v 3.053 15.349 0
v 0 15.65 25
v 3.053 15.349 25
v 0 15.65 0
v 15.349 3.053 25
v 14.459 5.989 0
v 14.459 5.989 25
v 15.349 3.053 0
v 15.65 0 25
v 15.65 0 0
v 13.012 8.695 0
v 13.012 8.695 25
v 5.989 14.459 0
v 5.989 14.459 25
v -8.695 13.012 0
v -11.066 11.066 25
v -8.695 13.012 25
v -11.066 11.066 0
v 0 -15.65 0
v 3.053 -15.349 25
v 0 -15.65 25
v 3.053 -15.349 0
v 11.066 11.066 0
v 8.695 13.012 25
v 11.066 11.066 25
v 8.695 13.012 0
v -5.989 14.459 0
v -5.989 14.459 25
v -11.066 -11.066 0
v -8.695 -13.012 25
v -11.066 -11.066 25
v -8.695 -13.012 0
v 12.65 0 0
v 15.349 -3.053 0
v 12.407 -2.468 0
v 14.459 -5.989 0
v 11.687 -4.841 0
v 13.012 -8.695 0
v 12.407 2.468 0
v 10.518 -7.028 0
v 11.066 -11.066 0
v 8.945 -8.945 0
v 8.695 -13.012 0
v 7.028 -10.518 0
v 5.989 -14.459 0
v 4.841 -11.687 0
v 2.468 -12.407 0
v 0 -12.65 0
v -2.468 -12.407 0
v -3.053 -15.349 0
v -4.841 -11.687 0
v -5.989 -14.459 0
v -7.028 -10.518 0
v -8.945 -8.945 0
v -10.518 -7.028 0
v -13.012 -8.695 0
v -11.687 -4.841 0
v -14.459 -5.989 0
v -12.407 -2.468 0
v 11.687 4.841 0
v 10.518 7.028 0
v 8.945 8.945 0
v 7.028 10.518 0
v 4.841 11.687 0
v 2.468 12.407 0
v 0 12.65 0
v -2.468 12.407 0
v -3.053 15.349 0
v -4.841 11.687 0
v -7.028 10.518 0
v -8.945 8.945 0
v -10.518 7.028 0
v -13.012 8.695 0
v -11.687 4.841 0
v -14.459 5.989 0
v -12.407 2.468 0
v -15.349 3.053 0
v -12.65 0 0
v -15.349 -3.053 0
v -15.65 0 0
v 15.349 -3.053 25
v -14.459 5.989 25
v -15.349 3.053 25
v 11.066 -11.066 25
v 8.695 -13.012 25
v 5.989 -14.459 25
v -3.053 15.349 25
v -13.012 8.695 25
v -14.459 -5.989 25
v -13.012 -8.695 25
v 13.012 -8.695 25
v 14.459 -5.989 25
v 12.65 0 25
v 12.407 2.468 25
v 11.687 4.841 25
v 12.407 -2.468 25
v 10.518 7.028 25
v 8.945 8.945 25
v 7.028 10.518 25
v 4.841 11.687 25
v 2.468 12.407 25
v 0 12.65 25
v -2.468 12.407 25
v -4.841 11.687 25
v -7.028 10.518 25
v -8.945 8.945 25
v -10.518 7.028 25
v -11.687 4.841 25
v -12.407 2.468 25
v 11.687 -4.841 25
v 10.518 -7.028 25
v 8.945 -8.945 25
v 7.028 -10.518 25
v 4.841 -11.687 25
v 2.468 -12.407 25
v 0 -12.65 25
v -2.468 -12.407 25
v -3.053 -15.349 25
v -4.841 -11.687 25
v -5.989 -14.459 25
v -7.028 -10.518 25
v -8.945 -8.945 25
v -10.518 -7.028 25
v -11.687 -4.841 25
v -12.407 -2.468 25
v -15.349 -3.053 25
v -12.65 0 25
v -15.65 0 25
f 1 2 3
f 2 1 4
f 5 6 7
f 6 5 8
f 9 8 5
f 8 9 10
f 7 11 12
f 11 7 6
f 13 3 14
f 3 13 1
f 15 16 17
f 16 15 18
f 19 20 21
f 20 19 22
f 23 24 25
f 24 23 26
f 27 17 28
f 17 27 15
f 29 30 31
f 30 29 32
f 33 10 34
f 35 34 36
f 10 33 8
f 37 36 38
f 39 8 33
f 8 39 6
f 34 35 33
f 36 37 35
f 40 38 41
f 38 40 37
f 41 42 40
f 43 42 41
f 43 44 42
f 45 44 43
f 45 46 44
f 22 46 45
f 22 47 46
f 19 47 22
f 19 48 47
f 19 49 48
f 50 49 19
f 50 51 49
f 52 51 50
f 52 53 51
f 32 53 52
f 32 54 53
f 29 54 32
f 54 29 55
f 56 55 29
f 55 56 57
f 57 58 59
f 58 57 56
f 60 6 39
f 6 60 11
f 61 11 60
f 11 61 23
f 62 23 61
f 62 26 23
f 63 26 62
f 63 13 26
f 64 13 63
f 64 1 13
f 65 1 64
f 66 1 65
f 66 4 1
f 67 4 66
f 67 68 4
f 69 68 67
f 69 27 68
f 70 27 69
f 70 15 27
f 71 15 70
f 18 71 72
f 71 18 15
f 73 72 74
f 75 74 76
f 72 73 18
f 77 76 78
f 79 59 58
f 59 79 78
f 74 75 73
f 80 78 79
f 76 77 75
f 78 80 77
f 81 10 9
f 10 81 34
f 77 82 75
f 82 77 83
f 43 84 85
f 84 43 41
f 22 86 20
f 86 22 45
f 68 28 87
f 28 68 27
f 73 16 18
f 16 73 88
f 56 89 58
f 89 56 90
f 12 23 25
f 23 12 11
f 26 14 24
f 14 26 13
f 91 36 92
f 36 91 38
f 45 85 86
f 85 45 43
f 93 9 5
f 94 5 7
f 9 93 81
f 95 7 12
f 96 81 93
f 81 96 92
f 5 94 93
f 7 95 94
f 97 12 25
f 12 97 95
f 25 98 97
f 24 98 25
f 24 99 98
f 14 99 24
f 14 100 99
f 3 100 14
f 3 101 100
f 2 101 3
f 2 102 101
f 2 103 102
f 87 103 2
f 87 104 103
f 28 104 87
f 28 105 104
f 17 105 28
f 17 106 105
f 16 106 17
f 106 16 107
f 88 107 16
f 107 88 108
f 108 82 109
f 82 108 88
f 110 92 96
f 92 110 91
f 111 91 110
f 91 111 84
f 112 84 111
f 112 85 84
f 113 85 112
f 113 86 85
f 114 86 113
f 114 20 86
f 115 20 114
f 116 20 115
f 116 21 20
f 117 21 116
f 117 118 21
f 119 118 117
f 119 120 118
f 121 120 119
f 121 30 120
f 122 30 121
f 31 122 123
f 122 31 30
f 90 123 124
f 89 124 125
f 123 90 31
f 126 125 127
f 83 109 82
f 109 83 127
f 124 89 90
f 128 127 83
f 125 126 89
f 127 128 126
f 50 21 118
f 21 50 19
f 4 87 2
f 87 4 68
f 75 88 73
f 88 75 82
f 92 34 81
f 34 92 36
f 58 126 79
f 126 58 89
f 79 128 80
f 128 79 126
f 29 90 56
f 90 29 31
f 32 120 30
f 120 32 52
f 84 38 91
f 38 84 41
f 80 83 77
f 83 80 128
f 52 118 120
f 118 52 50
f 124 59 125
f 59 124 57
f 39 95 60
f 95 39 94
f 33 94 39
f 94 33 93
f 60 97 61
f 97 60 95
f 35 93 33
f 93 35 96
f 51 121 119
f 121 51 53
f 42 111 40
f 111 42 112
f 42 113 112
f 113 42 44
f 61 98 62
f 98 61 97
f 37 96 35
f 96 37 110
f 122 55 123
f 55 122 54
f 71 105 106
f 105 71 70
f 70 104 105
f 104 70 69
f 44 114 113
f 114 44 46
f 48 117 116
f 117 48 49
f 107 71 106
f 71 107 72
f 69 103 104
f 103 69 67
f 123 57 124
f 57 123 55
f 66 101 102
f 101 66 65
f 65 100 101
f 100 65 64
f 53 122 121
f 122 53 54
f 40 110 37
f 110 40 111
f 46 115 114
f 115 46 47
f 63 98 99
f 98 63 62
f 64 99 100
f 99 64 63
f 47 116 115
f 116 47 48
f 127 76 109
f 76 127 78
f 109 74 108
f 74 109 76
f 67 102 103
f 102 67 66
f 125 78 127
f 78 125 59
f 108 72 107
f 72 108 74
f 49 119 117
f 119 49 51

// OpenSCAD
$fn = 32;

// ----------------------------------------------------------------------
// Spacer sleeve: 31.3 / 25.3 x 25 mm
// ----------------------------------------------------------------------

// --- parameters (mm) ---
outer_d = 31.3;           // outside diameter
inner_d = 25.3;           // shaft bore
length = 25;              // sleeve length

module sleeve() {
  cylinder(h = length, d = outer_d);
}

difference() {
  sleeve();
  translate([0, 0, -1]) cylinder(h = length + 2, d = inner_d);
}
